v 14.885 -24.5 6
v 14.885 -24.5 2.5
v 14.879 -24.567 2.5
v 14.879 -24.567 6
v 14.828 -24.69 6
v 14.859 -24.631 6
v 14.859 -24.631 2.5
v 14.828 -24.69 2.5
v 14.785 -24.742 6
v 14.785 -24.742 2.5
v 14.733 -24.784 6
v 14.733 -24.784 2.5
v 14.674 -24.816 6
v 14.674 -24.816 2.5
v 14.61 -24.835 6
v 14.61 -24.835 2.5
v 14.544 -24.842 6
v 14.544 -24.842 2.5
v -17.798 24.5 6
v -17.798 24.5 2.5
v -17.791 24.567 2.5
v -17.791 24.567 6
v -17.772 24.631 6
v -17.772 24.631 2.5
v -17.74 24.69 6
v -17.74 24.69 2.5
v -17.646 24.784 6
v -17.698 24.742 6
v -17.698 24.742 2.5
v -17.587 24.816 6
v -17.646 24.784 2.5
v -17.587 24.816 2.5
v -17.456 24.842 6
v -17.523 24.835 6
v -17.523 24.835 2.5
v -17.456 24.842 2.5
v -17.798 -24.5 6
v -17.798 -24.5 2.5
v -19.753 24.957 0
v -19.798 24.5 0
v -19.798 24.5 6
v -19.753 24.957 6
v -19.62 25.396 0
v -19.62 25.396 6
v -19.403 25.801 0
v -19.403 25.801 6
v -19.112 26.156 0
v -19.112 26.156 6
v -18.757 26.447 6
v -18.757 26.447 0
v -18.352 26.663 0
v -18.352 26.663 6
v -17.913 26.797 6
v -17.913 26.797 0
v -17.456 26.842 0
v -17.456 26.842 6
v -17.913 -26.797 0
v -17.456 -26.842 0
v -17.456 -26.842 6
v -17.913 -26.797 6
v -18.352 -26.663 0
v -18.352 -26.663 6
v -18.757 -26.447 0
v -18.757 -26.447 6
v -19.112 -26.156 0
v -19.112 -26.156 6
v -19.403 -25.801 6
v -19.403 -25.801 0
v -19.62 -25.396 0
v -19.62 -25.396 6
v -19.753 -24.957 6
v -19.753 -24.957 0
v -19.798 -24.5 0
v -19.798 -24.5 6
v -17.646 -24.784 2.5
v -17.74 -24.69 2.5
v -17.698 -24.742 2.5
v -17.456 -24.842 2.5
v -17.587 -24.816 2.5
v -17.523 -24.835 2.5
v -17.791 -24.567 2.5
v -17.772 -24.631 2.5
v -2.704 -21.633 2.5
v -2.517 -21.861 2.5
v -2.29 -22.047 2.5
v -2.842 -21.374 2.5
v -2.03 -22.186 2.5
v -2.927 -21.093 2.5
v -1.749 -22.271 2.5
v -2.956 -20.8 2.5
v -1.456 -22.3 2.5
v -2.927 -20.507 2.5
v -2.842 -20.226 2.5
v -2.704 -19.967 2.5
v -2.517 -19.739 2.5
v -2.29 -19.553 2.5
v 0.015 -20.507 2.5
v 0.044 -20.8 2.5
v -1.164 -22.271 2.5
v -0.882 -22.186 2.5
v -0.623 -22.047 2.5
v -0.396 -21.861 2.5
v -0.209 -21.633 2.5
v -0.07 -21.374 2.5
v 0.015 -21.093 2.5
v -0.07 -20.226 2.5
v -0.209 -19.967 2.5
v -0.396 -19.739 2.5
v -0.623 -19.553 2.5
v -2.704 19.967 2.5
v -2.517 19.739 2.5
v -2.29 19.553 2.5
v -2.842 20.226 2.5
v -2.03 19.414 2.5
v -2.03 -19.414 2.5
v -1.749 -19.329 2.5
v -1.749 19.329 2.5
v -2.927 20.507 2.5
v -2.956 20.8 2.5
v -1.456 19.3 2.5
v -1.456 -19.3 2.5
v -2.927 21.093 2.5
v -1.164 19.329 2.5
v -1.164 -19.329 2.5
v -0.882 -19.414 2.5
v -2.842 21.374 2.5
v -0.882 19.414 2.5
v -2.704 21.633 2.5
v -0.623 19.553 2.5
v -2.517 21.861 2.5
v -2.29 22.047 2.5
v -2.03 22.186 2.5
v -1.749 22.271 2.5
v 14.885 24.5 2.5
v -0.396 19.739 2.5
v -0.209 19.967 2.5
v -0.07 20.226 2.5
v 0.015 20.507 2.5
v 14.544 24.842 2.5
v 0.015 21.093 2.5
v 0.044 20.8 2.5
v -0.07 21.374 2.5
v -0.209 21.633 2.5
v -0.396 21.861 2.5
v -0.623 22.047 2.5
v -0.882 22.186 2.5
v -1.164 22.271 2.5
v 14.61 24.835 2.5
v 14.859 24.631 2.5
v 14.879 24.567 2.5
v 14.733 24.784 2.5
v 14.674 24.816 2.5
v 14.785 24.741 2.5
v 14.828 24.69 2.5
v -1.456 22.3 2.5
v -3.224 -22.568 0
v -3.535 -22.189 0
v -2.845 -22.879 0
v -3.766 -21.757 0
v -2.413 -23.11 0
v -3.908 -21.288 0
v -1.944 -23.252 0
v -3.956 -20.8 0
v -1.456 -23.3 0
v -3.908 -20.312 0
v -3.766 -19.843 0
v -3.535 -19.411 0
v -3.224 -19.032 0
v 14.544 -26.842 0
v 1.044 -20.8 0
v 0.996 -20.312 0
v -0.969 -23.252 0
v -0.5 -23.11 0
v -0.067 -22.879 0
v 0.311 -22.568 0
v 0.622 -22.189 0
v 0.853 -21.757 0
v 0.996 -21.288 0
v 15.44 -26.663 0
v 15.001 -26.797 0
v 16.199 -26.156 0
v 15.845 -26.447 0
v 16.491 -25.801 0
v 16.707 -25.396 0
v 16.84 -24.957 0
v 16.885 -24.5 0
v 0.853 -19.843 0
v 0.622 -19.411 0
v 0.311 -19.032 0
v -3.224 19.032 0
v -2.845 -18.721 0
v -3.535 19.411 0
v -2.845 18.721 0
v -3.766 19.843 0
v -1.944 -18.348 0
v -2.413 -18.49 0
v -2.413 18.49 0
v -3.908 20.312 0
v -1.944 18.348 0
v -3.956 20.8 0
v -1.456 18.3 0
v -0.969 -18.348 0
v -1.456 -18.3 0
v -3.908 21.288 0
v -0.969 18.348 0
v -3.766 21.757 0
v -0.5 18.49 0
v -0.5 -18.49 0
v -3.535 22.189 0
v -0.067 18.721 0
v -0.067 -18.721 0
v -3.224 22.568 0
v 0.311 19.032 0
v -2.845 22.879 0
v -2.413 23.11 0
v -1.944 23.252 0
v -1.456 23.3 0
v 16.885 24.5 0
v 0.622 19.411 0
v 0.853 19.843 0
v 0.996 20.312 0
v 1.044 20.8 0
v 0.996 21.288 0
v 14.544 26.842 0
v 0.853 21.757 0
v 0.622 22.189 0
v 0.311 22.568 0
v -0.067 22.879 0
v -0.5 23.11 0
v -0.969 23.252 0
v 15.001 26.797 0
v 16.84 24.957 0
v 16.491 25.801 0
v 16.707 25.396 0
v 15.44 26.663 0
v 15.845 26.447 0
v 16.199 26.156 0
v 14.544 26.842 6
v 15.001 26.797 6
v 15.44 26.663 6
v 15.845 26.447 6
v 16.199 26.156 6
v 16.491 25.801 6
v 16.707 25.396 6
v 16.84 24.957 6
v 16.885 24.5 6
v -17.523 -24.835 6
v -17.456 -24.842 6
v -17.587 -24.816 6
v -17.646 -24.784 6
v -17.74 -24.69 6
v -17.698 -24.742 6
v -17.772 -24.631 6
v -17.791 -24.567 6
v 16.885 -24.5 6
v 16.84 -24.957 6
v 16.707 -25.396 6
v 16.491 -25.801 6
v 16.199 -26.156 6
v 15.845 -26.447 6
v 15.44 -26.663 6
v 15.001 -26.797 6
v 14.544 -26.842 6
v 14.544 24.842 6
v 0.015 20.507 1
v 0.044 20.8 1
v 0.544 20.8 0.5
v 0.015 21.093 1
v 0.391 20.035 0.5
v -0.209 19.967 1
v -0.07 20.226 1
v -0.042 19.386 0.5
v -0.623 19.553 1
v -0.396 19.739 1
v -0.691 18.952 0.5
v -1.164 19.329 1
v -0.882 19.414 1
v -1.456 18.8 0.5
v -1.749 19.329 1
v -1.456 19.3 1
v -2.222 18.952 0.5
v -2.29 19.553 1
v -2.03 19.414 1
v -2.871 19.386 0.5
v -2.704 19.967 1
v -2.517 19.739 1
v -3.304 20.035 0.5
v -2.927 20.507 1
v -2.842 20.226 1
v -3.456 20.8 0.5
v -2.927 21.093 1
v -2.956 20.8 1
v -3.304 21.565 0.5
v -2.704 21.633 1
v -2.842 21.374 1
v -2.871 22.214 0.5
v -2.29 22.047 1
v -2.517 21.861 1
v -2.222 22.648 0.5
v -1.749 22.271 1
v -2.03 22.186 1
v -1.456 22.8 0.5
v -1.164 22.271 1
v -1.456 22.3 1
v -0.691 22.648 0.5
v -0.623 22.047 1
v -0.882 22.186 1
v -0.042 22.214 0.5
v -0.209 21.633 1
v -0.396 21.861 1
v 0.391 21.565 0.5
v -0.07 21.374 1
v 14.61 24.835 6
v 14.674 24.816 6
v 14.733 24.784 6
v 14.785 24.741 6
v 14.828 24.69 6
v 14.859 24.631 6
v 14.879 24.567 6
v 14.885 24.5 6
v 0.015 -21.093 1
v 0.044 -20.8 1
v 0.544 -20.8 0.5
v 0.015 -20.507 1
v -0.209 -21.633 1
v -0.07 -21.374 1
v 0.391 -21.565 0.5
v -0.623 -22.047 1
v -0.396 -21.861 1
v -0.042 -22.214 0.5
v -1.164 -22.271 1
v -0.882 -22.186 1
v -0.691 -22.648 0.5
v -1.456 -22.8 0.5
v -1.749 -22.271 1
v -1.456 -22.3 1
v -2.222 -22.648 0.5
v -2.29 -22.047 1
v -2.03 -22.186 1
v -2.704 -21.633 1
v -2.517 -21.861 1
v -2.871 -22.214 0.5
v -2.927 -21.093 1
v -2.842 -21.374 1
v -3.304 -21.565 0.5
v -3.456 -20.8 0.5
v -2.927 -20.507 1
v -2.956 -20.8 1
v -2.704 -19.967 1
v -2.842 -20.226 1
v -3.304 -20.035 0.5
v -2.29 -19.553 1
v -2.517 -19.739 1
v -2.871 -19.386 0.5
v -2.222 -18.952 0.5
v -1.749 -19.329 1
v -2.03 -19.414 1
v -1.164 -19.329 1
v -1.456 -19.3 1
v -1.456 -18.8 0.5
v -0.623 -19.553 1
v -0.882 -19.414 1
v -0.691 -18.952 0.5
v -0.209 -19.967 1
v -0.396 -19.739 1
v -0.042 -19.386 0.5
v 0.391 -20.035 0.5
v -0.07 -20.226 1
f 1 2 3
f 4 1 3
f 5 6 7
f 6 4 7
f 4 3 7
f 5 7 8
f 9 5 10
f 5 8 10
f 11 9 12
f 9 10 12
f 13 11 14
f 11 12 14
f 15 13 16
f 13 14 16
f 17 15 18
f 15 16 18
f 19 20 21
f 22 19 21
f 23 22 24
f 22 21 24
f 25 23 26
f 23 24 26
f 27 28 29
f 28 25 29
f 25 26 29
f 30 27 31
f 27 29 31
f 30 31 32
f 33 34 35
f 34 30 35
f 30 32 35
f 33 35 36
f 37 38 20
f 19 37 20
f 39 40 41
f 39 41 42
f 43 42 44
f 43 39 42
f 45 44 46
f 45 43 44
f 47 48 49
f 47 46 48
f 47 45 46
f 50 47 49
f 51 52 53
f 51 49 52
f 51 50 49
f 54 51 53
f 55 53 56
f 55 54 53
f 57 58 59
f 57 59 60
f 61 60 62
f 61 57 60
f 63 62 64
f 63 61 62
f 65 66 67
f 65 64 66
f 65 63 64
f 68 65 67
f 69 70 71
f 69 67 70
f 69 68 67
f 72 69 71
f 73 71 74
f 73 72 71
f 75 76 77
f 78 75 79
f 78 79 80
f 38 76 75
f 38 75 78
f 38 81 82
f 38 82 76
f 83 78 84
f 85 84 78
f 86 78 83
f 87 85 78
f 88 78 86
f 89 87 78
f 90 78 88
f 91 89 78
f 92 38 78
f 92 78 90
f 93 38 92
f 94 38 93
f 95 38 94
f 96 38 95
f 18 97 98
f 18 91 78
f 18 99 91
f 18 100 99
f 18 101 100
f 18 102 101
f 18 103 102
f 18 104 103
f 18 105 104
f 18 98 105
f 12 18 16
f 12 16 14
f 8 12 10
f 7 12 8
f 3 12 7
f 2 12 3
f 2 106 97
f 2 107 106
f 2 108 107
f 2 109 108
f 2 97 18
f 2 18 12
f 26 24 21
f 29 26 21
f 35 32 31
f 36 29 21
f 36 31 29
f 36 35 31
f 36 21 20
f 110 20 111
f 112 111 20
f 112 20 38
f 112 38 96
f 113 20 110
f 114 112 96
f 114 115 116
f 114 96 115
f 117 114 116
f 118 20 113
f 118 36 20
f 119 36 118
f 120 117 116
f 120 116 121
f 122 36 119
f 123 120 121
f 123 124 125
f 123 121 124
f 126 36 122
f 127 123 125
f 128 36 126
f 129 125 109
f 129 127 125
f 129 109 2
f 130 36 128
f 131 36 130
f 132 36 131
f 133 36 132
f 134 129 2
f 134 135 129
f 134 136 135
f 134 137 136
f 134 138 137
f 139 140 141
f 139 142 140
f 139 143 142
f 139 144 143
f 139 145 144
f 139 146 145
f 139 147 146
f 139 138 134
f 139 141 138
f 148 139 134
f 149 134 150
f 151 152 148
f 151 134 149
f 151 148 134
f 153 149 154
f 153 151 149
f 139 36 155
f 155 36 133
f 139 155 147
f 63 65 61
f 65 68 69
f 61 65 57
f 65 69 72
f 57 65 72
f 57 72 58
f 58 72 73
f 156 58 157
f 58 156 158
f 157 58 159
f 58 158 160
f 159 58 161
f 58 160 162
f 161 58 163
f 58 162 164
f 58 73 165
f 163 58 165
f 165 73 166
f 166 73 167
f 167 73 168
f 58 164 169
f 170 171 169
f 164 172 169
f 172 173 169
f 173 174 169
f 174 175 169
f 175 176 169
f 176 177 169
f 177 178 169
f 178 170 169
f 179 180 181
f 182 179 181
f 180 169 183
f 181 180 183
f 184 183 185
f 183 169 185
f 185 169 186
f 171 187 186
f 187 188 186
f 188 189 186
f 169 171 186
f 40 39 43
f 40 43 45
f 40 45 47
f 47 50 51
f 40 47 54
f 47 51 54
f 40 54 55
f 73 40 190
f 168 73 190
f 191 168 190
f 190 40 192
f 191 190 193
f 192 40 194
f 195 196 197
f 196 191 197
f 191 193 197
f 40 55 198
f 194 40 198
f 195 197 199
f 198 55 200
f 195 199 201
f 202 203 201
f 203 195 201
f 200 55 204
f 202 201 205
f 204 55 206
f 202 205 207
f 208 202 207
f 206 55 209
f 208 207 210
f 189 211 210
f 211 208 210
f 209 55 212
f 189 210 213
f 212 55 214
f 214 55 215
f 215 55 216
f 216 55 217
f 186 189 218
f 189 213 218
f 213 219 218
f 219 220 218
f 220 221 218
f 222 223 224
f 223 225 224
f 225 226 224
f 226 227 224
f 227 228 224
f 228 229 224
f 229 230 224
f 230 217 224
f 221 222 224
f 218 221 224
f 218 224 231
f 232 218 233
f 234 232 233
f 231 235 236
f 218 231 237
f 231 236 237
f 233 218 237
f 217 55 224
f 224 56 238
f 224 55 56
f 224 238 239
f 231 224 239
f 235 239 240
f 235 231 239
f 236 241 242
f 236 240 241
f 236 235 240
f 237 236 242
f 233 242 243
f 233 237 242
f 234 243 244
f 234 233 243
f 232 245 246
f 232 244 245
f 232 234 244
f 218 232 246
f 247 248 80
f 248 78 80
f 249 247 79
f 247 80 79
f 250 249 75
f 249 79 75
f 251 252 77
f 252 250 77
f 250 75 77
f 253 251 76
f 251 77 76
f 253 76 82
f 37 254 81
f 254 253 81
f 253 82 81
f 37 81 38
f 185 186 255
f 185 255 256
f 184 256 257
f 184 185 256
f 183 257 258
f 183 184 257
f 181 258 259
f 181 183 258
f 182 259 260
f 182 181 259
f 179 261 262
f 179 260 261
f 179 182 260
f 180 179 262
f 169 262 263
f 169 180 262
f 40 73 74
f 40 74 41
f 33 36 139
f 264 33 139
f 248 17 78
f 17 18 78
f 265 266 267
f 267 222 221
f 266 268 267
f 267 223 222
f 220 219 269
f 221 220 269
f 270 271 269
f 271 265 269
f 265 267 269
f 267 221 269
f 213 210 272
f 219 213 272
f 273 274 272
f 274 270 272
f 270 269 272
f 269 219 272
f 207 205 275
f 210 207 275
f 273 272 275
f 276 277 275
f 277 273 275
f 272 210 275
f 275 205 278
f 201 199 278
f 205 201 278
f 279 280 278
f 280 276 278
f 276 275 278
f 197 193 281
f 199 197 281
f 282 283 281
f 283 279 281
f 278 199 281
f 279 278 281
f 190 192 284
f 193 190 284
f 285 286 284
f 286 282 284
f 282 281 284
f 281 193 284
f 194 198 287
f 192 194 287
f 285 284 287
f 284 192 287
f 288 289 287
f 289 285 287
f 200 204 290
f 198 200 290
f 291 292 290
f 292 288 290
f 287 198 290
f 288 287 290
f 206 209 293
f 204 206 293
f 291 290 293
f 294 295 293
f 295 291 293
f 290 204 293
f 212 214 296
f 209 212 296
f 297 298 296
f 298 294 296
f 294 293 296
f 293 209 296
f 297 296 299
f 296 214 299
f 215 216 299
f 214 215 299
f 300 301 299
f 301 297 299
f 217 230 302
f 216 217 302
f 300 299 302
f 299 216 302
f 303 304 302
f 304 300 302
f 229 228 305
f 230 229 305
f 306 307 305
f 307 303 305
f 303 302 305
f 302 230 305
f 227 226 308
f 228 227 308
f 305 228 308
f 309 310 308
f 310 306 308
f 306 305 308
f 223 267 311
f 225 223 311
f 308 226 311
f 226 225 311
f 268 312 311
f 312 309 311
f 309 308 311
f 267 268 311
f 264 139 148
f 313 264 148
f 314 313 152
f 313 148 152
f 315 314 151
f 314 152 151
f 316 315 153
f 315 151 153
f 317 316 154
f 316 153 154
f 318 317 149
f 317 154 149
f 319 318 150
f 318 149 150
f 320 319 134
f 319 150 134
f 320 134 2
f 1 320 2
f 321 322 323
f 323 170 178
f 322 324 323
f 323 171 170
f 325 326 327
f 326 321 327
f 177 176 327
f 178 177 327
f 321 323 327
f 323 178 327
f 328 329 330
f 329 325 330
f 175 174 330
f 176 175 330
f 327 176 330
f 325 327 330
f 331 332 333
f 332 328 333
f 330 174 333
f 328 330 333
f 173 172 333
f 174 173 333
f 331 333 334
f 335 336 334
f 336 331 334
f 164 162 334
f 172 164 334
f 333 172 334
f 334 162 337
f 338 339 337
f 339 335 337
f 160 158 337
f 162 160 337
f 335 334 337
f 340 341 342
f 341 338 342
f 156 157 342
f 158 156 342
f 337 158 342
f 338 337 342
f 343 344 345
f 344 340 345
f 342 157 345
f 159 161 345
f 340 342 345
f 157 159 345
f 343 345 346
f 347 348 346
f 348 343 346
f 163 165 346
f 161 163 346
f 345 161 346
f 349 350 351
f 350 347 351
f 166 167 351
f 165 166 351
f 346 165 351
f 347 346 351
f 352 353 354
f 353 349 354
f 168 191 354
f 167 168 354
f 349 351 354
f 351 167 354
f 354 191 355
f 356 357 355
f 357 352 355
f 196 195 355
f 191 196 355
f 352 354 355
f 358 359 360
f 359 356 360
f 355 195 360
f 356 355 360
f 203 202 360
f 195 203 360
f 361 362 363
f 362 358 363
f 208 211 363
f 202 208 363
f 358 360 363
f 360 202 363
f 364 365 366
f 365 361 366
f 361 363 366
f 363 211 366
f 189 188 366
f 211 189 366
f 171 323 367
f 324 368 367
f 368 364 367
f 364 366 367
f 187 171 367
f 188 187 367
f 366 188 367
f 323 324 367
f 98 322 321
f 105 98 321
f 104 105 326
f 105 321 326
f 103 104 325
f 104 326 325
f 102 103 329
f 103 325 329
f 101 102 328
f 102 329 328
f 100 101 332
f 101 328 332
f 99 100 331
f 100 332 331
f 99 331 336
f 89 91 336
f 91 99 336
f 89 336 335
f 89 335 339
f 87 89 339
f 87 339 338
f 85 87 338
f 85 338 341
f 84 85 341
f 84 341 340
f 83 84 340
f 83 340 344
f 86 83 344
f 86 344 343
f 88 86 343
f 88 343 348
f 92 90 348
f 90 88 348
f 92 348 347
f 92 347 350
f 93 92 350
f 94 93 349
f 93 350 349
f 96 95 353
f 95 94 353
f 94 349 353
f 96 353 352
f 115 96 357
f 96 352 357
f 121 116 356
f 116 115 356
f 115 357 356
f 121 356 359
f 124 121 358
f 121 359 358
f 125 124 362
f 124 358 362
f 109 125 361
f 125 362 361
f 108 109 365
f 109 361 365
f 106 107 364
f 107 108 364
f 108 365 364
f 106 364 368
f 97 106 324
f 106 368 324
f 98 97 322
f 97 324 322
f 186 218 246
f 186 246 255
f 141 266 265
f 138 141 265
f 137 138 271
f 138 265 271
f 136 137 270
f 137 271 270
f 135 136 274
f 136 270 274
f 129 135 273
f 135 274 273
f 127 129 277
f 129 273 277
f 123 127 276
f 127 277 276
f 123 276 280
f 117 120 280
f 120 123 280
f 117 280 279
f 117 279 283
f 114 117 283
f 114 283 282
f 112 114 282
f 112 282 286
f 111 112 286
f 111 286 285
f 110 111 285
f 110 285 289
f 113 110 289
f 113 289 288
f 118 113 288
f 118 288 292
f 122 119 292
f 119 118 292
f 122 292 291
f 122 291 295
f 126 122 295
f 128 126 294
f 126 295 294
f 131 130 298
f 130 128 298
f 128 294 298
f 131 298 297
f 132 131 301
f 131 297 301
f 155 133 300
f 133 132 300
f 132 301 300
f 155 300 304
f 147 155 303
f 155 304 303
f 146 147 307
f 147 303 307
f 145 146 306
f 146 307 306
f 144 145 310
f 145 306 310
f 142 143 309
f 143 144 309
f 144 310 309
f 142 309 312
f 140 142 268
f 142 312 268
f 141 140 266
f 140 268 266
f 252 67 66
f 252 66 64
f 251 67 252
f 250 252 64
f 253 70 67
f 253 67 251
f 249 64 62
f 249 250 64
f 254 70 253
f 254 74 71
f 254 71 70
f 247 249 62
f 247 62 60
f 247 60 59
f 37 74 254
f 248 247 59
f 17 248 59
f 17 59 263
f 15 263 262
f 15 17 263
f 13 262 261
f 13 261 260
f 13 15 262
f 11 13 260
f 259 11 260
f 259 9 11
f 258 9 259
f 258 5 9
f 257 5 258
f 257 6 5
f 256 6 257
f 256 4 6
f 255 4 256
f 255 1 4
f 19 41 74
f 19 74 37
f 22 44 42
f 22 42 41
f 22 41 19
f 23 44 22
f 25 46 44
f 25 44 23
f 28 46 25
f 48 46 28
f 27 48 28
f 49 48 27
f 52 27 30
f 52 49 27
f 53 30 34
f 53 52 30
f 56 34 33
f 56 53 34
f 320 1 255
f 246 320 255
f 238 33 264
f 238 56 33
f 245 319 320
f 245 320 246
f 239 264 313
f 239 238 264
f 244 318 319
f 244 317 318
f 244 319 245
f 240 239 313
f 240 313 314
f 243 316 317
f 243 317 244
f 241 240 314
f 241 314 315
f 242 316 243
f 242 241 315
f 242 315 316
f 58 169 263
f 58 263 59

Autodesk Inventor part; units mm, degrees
ref_plane "YZ Plane" through (0, 0, 0) normal (1, 0, 0) x (0, 1, 0)
ref_plane "XZ Plane" through (0, 0, 0) normal (0, 1, 0) x (-1, 0, 0)
ref_plane "XY Plane" through (0, 0, 0) normal (0, 0, 1) x (1, 0, 0)
sketch "Sketch1" plane through (0, 0, 0) normal (0, 0, 1) x (1, 0, 0)
  circle A0 centre (-1.4563, 20.8) radius 1.5
  circle A1 centre (-1.4563, -20.8) radius 1.5
  arc A2 (-17.4563, 26.8416) -> (-19.7979, 24.5) centre (-17.4563, 24.5) ccw
  line L0 (-19.7979, -24.5) -> (-19.7979, 24.5)
  arc A3 (-19.7979, -24.5) -> (-17.4563, -26.8416) centre (-17.4563, -24.5) ccw
  line L1 (14.5437, -26.8416) -> (-17.4563, -26.8416)
  arc A4 (14.5437, -26.8416) -> (16.8852, -24.5) centre (14.5437, -24.5) ccw
  line L2 (16.8852, 24.5) -> (16.8852, -24.5)
  arc A5 (16.8852, 24.5) -> (14.5437, 26.8416) centre (14.5437, 24.5) ccw
  line L3 (-17.4563, 26.8416) -> (14.5437, 26.8416)
  arc A6 (14.8852, 24.5) -> (14.5437, 24.8416) centre (14.5437, 24.5) ccw
  line L4 (14.8852, 24.5) -> (14.8852, -24.5)
  arc A7 (14.5437, -24.8416) -> (14.8852, -24.5) centre (14.5437, -24.5) ccw
  line L5 (14.5437, -24.8416) -> (-17.4563, -24.8416)
  arc A8 (-17.7979, -24.5) -> (-17.4563, -24.8416) centre (-17.4563, -24.5) ccw
  line L6 (-17.7979, -24.5) -> (-17.7979, 24.5)
  arc A9 (-17.4563, 24.8416) -> (-17.7979, 24.5) centre (-17.4563, 24.5) ccw
  line L7 (-17.4563, 24.8416) -> (14.5437, 24.8416)
  point P0 (0, 0)
  point P1 (0, 0)
  dimension "d0" = 2
extrude "Extrusion1" add sketch "Sketch1" along normal blind 6 contours L3 A5 L2 A4 L1 A3 L0 A2
extrude "Extrusion2" add sketch "Sketch1" along normal blind 2.5 contours L4 A7 L5 A8 L6 A9 L7 A6
sketch "Sketch2" plane through (0, 0, 2.5) normal (0, 0, 1) x (1, 0, 0)
  circle A0 centre (-1.4563, -20.8) radius 1.5 projected
  circle A1 centre (-1.4563, 20.8) radius 1.5 projected
  line L0 (14.8852, 24.5) -> (14.8852, -24.5) projected
  arc A2 (14.8852, 24.5) -> (14.5437, 24.8416) centre (14.5437, 24.5) ccw projected
  line L1 (-17.4563, 24.8416) -> (14.5437, 24.8416) projected
  arc A3 (-17.4563, 24.8416) -> (-17.7979, 24.5) centre (-17.4563, 24.5) ccw projected
  line L2 (-17.7979, -24.5) -> (-17.7979, 24.5) projected
  arc A4 (-17.7979, -24.5) -> (-17.4563, -24.8416) centre (-17.4563, -24.5) ccw projected
  line L3 (14.5437, -24.8416) -> (-17.4563, -24.8416) projected
  arc A5 (14.5437, -24.8416) -> (14.8852, -24.5) centre (14.5437, -24.5) ccw projected
  point P0 (0, 0)
chamfer "Chamfer1" distance 1 angle 45 2 edges at (-2.9563, -20.8, 0) (-2.9563, 20.8, 0)
properties part number "Tapa"
